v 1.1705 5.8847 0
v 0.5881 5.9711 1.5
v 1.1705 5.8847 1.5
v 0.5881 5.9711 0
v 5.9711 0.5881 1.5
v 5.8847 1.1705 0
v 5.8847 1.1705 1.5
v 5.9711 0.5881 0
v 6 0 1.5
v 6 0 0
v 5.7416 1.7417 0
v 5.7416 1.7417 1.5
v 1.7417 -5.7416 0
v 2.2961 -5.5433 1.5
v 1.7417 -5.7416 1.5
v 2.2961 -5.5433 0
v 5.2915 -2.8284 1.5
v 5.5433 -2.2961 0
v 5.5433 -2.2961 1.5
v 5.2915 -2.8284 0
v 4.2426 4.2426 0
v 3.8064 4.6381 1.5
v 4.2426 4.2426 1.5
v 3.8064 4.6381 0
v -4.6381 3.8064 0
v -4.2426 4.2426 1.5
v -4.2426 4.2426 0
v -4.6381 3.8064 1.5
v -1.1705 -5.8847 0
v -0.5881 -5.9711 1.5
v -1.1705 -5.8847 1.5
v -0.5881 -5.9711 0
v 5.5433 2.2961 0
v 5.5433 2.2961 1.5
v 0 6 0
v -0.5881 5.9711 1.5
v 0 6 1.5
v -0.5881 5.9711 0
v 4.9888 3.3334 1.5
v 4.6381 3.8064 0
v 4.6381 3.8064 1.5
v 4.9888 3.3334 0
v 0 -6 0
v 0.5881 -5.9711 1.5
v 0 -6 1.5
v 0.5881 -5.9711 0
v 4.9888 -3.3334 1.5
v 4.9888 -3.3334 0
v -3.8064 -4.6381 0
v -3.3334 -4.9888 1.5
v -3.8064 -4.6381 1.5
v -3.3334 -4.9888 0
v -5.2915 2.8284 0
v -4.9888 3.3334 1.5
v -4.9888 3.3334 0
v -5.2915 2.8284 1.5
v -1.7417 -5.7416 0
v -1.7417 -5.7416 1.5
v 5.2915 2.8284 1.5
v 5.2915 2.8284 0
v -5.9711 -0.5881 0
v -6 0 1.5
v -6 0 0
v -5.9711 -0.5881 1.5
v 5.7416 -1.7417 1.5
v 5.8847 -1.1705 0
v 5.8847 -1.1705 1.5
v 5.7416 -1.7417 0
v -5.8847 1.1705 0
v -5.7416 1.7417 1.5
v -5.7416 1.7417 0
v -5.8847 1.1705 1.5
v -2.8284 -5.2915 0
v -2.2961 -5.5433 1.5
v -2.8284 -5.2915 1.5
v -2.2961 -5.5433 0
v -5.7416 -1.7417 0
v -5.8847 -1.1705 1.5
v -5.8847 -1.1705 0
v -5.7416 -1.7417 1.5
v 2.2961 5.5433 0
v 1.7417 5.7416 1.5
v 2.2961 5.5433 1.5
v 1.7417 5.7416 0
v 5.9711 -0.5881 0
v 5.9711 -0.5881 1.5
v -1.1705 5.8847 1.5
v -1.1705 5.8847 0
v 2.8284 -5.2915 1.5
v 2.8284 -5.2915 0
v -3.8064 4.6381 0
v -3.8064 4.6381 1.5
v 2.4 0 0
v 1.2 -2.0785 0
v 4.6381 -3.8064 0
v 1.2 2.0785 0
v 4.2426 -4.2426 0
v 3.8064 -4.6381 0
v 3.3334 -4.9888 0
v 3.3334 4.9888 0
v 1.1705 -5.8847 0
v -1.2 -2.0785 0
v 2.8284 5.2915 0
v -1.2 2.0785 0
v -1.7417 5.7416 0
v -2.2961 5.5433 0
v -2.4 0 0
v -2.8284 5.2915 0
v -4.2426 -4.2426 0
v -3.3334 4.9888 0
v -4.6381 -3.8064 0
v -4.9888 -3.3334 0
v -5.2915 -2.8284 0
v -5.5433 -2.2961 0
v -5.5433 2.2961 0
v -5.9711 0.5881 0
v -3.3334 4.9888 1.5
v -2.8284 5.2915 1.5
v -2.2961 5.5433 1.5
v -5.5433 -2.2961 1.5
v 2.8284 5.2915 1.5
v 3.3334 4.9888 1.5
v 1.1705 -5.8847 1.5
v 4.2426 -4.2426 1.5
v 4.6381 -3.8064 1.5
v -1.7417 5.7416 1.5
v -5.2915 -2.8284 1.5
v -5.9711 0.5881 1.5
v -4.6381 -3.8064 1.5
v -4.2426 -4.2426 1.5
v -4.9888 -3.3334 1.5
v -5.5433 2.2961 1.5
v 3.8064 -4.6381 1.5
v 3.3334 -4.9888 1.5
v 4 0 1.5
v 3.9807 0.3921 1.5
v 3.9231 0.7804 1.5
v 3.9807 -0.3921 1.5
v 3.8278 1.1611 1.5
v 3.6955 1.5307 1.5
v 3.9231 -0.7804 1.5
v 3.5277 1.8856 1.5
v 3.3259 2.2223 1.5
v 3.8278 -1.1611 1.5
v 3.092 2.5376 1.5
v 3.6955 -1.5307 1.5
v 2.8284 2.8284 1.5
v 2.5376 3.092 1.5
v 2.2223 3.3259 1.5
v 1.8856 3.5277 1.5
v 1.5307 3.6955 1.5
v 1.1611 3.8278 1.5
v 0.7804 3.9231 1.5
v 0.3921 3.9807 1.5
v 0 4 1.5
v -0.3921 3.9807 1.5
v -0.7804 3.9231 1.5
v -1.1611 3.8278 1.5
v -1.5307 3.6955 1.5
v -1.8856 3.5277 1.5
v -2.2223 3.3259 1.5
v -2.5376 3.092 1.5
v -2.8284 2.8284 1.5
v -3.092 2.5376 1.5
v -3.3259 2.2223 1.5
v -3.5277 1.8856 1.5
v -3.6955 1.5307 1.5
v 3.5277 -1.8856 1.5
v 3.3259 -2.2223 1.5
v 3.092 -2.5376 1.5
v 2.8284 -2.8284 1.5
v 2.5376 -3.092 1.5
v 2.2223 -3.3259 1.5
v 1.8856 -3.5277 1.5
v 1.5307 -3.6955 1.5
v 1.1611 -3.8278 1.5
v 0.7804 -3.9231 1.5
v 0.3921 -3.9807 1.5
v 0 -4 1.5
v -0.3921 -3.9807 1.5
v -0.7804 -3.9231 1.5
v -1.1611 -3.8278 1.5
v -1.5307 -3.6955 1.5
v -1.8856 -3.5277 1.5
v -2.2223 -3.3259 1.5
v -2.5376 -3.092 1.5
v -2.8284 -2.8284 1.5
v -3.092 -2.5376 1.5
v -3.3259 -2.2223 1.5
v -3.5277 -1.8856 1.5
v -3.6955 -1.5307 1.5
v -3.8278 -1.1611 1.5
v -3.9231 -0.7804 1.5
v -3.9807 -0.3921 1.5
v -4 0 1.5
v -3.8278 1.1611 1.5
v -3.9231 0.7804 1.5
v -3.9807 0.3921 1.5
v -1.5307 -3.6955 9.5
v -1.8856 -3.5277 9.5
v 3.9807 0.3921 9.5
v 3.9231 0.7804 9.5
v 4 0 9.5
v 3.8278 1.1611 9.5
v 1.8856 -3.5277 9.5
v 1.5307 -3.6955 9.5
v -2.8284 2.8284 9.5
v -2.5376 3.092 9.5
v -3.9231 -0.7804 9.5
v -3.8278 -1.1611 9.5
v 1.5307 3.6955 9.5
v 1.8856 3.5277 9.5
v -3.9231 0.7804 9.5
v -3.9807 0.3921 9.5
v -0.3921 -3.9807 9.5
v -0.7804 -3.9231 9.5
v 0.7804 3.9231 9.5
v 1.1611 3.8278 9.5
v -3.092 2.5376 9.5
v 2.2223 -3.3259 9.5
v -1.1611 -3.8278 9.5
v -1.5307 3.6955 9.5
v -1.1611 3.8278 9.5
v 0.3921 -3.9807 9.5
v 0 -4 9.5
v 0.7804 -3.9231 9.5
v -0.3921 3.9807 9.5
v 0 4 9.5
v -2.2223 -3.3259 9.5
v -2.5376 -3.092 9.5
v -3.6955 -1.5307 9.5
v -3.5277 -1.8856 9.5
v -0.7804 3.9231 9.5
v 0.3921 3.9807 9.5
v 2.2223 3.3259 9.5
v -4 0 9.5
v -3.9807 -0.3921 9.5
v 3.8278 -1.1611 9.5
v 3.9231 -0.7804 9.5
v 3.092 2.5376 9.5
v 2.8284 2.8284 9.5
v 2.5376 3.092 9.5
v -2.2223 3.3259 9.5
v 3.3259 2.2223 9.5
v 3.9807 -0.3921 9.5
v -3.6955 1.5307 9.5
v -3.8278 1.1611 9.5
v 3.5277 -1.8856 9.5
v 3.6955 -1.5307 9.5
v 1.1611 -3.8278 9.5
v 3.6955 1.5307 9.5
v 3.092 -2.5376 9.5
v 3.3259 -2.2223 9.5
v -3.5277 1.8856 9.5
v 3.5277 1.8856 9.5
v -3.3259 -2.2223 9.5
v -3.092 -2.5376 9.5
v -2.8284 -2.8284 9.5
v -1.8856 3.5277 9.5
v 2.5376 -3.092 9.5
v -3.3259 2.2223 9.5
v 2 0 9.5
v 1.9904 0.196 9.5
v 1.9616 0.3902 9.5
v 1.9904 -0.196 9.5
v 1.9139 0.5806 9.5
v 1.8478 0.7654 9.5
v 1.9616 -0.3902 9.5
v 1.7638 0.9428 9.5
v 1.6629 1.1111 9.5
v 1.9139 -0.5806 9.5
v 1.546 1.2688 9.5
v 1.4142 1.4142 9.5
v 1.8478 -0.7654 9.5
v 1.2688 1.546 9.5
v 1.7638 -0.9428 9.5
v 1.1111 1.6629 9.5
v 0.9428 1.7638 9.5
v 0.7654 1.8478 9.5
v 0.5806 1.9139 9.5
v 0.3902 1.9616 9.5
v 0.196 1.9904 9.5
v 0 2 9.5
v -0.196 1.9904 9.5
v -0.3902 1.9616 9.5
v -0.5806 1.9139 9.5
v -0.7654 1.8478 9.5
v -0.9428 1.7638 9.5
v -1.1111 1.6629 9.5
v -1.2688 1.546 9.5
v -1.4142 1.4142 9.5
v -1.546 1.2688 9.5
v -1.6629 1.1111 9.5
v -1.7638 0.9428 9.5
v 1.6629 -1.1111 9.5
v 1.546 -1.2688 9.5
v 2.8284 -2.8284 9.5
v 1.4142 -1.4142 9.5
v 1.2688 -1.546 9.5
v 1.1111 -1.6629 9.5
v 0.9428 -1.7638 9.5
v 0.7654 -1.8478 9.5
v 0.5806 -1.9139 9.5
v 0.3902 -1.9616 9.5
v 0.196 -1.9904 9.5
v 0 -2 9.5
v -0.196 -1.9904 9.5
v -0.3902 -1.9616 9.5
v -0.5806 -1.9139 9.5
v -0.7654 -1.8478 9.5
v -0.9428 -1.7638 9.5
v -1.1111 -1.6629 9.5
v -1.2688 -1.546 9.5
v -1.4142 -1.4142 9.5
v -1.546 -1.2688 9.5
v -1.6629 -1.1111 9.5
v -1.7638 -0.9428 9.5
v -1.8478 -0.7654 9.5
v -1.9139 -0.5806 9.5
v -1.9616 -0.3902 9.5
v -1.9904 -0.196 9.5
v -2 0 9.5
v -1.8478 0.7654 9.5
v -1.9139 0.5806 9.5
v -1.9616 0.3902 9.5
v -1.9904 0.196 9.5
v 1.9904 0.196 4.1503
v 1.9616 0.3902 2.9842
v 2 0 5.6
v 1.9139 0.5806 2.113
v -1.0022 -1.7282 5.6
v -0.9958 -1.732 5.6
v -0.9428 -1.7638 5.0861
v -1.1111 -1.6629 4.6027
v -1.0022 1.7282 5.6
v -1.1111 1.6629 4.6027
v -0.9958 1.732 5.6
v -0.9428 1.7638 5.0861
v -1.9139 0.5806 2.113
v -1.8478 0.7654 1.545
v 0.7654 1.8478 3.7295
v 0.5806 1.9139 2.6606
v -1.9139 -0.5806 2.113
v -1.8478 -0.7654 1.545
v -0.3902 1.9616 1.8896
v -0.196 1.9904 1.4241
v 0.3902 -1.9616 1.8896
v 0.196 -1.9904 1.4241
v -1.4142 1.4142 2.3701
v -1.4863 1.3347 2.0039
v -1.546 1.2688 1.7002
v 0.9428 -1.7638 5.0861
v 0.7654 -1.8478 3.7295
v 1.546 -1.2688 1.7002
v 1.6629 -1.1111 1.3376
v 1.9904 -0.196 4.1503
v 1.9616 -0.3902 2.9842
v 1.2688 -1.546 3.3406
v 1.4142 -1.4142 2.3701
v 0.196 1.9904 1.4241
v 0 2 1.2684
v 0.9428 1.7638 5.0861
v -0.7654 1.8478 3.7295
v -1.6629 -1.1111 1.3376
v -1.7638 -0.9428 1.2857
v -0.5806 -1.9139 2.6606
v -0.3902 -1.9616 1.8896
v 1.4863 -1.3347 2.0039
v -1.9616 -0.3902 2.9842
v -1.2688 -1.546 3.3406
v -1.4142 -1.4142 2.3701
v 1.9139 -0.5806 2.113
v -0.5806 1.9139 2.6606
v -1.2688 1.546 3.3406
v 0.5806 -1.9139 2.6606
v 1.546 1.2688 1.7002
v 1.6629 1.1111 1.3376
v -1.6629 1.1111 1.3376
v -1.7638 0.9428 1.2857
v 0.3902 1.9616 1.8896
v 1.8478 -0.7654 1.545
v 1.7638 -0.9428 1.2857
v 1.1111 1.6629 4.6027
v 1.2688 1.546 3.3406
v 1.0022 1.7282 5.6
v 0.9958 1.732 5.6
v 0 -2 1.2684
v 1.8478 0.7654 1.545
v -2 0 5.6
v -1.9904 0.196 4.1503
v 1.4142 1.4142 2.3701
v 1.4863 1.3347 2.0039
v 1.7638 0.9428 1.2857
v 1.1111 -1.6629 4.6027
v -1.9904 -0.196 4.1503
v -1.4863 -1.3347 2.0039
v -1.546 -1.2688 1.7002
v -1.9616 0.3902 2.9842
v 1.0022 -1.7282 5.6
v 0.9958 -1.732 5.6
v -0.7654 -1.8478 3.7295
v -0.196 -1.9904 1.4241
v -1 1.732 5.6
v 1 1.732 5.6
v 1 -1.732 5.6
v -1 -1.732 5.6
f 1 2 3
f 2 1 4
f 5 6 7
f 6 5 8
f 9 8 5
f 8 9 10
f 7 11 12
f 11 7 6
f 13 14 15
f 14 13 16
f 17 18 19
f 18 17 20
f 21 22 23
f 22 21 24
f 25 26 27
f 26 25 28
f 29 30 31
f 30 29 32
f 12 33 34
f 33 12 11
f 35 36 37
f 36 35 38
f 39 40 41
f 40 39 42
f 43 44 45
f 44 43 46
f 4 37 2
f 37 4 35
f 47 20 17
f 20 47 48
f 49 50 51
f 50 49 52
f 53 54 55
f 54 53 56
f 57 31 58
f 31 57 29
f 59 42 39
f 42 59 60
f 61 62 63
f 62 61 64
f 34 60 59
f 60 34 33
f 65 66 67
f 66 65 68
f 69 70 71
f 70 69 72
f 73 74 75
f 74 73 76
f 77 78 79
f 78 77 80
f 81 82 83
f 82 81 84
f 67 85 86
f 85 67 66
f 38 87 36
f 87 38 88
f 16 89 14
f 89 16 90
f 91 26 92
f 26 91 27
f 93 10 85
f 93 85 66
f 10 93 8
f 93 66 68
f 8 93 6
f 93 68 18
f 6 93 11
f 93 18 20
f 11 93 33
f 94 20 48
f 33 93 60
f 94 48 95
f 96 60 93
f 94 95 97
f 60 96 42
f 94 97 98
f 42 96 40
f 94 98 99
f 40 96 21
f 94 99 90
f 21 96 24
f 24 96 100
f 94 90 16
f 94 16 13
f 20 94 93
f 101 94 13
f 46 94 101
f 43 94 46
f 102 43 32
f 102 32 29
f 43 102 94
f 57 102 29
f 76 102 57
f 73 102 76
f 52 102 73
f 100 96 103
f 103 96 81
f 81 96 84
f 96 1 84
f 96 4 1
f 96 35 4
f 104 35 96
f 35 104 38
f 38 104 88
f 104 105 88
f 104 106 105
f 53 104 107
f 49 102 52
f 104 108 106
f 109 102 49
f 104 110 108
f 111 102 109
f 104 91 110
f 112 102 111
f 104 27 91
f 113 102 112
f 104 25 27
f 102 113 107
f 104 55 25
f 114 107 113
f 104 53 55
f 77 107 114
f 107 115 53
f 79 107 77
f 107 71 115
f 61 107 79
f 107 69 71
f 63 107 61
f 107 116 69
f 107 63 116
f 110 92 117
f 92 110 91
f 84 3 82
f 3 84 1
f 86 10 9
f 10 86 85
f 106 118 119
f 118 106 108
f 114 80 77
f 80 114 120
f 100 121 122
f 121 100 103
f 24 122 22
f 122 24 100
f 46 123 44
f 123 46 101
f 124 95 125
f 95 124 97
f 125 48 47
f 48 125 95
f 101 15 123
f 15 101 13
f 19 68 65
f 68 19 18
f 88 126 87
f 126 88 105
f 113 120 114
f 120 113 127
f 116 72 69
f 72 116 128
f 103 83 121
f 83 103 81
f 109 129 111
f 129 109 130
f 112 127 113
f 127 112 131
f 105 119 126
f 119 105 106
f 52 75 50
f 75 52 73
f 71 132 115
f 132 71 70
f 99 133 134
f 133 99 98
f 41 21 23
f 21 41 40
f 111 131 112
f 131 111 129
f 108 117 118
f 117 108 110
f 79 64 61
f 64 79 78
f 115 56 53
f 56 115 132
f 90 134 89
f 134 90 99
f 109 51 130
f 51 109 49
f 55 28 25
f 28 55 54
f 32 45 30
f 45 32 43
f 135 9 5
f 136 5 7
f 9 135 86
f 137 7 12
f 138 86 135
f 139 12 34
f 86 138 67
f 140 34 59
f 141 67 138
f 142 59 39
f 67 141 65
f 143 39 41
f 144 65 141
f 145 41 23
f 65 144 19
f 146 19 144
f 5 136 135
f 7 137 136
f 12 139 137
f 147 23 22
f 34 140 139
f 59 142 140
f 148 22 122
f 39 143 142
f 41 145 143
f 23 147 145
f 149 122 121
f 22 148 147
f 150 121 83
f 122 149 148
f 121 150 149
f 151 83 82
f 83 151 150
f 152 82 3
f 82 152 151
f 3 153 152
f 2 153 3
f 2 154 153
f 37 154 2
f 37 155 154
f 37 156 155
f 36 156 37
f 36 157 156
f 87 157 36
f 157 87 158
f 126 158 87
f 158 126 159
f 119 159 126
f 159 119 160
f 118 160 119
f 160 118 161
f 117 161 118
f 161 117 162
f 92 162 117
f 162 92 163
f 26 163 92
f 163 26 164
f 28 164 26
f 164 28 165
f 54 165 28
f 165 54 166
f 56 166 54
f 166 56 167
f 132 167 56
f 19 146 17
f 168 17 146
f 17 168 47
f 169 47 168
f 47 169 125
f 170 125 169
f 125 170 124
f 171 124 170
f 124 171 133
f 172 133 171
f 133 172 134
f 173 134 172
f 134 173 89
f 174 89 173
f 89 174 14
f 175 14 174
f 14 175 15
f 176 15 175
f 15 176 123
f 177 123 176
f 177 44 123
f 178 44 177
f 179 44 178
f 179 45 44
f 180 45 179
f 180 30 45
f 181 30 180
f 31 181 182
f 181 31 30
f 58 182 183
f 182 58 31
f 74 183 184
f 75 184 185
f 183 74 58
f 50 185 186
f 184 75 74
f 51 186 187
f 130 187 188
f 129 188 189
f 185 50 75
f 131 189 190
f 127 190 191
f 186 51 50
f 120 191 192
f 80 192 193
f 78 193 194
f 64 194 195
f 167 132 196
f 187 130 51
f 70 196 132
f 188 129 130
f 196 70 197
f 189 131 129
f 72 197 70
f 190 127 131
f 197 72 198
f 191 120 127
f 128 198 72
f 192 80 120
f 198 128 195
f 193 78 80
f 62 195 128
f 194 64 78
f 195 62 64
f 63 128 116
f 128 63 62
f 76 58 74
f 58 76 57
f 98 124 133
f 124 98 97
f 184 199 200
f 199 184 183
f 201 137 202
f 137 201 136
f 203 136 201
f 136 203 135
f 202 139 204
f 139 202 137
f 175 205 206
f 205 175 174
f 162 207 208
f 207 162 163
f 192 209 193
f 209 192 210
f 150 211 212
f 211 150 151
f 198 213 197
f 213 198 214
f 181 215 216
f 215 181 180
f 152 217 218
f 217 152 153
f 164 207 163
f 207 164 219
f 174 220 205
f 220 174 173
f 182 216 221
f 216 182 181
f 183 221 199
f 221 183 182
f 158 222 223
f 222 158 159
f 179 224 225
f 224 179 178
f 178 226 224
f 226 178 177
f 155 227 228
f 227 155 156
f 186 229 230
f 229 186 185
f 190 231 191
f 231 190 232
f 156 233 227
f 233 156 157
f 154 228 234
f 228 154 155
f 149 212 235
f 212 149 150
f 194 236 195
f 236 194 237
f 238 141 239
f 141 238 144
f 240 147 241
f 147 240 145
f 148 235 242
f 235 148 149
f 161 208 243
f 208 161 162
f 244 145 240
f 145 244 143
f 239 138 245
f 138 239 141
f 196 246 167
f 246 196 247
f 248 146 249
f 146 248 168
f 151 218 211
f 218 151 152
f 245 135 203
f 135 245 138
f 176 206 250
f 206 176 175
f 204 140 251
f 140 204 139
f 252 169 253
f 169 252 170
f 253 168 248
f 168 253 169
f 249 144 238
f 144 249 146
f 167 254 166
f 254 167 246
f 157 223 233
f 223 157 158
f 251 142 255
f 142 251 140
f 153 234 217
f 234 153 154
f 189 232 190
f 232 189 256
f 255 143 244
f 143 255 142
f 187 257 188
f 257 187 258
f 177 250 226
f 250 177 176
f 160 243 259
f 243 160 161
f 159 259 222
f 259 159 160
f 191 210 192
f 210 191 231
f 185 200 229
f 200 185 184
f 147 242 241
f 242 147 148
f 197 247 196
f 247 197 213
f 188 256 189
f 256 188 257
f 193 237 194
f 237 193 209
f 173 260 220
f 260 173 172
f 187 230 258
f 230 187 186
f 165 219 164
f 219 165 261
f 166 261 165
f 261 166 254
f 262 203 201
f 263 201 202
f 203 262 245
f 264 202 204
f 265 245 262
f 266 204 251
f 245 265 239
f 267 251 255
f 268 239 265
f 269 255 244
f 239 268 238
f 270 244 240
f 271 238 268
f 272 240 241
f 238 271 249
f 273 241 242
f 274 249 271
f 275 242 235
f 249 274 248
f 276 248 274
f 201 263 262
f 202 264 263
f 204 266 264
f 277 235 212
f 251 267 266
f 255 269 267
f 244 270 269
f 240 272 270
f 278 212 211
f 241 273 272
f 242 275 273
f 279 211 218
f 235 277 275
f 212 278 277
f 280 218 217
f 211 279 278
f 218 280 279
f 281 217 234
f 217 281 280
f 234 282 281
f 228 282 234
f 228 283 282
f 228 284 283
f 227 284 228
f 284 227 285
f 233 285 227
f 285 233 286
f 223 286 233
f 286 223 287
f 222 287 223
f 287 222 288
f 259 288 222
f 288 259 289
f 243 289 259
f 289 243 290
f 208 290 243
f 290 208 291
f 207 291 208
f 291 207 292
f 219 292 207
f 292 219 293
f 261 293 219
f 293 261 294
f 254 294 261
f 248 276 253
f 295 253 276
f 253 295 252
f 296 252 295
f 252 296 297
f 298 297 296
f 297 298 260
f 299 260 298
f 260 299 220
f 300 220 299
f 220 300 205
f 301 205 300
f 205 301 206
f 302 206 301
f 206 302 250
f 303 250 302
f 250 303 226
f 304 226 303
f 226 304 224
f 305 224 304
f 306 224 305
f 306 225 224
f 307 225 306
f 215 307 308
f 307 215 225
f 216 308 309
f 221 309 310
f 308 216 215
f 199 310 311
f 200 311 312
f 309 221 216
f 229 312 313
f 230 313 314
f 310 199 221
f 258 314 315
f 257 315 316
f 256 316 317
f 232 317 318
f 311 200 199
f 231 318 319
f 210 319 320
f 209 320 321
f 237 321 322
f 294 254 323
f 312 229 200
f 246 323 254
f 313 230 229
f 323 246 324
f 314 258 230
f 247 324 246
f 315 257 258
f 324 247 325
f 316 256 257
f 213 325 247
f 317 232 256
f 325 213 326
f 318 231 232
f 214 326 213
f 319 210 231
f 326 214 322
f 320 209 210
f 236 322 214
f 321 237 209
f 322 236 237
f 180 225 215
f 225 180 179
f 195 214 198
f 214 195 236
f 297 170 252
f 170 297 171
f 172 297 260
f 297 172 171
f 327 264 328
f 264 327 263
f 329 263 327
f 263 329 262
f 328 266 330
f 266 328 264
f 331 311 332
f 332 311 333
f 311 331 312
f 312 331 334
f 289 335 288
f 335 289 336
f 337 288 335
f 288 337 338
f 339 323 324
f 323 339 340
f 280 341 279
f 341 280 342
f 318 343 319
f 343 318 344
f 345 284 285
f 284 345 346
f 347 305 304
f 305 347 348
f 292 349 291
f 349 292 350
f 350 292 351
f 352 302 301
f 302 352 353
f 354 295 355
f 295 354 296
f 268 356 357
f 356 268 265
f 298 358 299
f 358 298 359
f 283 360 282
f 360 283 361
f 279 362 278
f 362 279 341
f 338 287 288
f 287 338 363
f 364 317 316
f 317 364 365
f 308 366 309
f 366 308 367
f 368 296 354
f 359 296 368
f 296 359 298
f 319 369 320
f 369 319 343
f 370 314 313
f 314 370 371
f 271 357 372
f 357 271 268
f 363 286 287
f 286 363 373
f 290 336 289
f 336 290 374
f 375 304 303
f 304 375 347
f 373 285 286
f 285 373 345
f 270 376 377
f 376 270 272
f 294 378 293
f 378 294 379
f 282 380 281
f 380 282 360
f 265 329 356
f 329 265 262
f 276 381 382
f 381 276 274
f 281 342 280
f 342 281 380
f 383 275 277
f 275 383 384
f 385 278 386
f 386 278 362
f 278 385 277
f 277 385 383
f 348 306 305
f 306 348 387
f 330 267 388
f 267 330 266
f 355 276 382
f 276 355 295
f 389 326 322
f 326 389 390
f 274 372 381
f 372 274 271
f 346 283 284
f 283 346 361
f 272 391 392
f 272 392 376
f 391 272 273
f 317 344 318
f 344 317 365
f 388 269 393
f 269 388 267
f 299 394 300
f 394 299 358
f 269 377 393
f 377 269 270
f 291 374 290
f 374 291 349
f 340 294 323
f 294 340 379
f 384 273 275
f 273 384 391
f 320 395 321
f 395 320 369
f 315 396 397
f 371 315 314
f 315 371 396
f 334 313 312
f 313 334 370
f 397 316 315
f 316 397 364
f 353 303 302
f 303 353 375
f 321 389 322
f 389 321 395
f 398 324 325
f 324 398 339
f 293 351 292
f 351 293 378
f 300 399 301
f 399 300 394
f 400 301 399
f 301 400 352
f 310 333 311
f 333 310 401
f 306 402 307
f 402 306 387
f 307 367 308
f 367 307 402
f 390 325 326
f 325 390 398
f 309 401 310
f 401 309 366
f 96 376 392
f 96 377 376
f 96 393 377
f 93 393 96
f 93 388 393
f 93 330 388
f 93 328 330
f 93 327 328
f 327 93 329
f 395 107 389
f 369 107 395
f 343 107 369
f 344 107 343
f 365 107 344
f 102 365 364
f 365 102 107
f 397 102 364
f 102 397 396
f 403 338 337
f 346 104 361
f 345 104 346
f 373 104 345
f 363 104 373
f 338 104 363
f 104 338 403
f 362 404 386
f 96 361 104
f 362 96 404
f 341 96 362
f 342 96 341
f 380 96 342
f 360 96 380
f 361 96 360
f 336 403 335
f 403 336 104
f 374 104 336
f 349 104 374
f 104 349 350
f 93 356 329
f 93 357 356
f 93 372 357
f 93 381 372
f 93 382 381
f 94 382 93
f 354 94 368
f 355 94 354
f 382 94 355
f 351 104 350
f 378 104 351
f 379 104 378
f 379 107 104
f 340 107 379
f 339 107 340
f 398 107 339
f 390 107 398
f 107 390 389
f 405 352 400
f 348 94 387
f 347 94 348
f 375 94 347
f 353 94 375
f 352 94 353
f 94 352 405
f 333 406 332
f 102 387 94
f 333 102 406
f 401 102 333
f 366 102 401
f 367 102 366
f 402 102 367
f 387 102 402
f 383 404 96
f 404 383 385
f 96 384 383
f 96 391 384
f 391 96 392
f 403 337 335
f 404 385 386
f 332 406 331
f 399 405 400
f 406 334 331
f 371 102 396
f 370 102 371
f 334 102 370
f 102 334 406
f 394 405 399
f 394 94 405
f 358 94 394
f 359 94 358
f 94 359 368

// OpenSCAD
// OpenSCAD Threads
// http://dkprojects.net/openscad-threads/
include <threads.scad>;
part = "Hollow_screw"; // [Hollow_screw, Main_body, Main_magnet_cover, Hose_adapter, Hose_sleeve,Magnetic_holder, Holder_magnet_cover,Instrument,All]
screw_shape="Allen"; //[Allen,Square,Hexagonal]
adapter_shape="Hexagonal"; //[Round,Square,Hexagonal]
light_trap=false;
hose_inner_diameter=6;
hose_outer_diameter=9;
main_part_holes=7;
insert_diameter=8;
screw_diameter=8;
seal_length=8;
magnet_diameter=15;
magnet_height=5;
wall_between_magnets=1;
thread_pitch=3;
thread_expand=2.0;
adapter_inner_diameter=4;
screw_inner_diameter=4;
offset=0;
rod_mount=false;
nut_width=16;
mount_hole=8;
$fn= $preview ? 32 : 64;
leader_length=10;
tap_length=30;
leader_diameter=7;
tap_diameter=8;
air_gap=0.5;
holding_depth=3;
onside=false;
degre=onside?90:0;
shape=(adapter_shape=="Round")?64:(adapter_shape=="Square")?4:6;
        coeff=  (adapter_shape == "Round") ? 1:(adapter_shape == "Square") ? 1.42:1.16;
    body_move=(light_trap)?(hose_outer_diameter/2+4)*coeff+2*main_part_holes+2:seal_length+main_part_holes/2+hose_outer_diameter/2+2;
shiftx=light_trap?-(max(offset+(magnet_diameter+2*0.541*thread_pitch)/2,2.5*main_part_holes+seal_length)):-(seal_length+main_part_holes/2);
shiftz=light_trap?coeff*(hose_outer_diameter+4)/2:seal_length+main_part_holes/2;
instrument_length=leader_length+tap_length+holding_depth;
module hollow_screw(){
    difference(){
        union(){
            cylinder(h=1.5,d=screw_diameter+4);
            translate([0,0,1.5])cylinder(h=seal_length,d=screw_diameter);}
            cylinder(d=screw_inner_diameter,h=seal_length+2);
            cylinder(seal_length*0.7,screw_inner_diameter*0.6,screw_inner_diameter*0.5, $fn=6);
        }
    }
    diameter_to_hold=magnet_diameter+2*0.541*thread_pitch+thread_expand+3;
    height_to_hold=magnet_height+thread_pitch*2+wall_between_magnets;
        
module main_body(nothread=false){
    if (light_trap==false)
    rotate([0,degre,0])translate([shiftx,0,0])difference(){
      union(){cylinder(d=max(main_part_holes+2*seal_length,magnet_diameter+2*0.541*thread_pitch),h=seal_length+main_part_holes/2+hose_outer_diameter/2+2);
      translate([0,-hose_outer_diameter/2-2,0]) cube([seal_length+main_part_holes/2, hose_outer_diameter+4,seal_length+main_part_holes/2+hose_outer_diameter/2+2]);
   translate([0,0,seal_length+main_part_holes/2+hose_outer_diameter/2+2]) metric_thread(magnet_diameter+2*0.541*thread_pitch,thread_pitch,thread_pitch*2,test=nothread);
      }
      translate([0,0,-1])cylinder(d=main_part_holes,h=seal_length+main_part_holes/2+1);
     translate([0,0,seal_length+main_part_holes/2])rotate([0,90,0])cylinder(d=main_part_holes, h=seal_length+main_part_holes/2+1);
      translate([0,0,seal_length+main_part_holes/2])intersection(){cylinder(d=main_part_holes, h=main_part_holes,center=true);rotate([0,90,0])cylinder(d=main_part_holes, h=main_part_holes,center=true);}
    }
else //light trap
        rotate([0,degre,0])translate([shiftx,0,0])difference(){
       union(){
           cylinder(d=hose_outer_diameter+4,h=(hose_outer_diameter/2+4)*coeff+2*main_part_holes+2);
           
           translate([offset,0,0])cylinder(d=magnet_diameter+2*0.541*thread_pitch,h=(hose_outer_diameter/2+4)*coeff+2*main_part_holes+2);
           translate([0,-hose_outer_diameter/2-2,0]) cube([max(offset+(magnet_diameter+2*0.541*thread_pitch)/2,2.5*main_part_holes+seal_length),hose_outer_diameter+4,(hose_outer_diameter/2+4)*coeff+2*main_part_holes+2]);
     translate([offset,0,(hose_outer_diameter/2+4)*coeff+2*main_part_holes+2]) metric_thread(magnet_diameter+2*0.541*thread_pitch,thread_pitch,thread_pitch*2,test=nothread);
           }
      translate([0,0,-1])cylinder(d=main_part_holes,h=coeff*(hose_outer_diameter+4)/2+2*main_part_holes+1);
      
       translate([0,0,coeff*(hose_outer_diameter+4)/2+2*main_part_holes])rotate([0,90,0])cylinder(d=main_part_holes,h=2*main_part_holes);     
           
      translate([2*main_part_holes,0,coeff*(hose_outer_diameter+4)/2])cylinder(d=main_part_holes,h=2*main_part_holes);
          
     translate([2*main_part_holes,0,coeff*(hose_outer_diameter+4)/2])rotate([0,90,0])cylinder(d=main_part_holes,h=offset+magnet_diameter/2+0.541*thread_pitch+seal_length); 
      
           translate([0,0,coeff*(hose_outer_diameter+4)/2+2*main_part_holes])intersection(){cylinder(d=main_part_holes, h=main_part_holes,center=true);rotate([0,90,0])cylinder(d=main_part_holes, h=main_part_holes,center=true);}
            translate([2*main_part_holes,0,coeff*(hose_outer_diameter+4)/2+2*main_part_holes])intersection(){cylinder(d=main_part_holes, h=main_part_holes,center=true);rotate([0,90,0])cylinder(d=main_part_holes, h=main_part_holes,center=true);}
            translate([2*main_part_holes,0,coeff*(hose_outer_diameter+4)/2])intersection(){cylinder(d=main_part_holes, h=main_part_holes,center=true);rotate([0,90,0])cylinder(d=main_part_holes, h=main_part_holes,center=true);}
    }
    }
module main_magnet_cover(nothread=false){
  difference(){
   cylinder(d=magnet_diameter+2*0.541*thread_pitch+thread_expand+3,h=magnet_height+thread_pitch*2+wall_between_magnets);
       translate([0,0,wall_between_magnets]){metric_thread(magnet_diameter+2*0.541*thread_pitch+thread_expand,thread_pitch,magnet_height+thread_pitch*2,internal=true,test=nothread);}
  }
}
module hose_adapter(){
    difference(){
        union(){
            cylinder(h=seal_length,d=insert_diameter);
            translate([0,0,seal_length])cylinder(h=4,d=(hose_outer_diameter+1)*coeff,$fn=shape);
            translate([0,0,seal_length+4])cylinder(h=seal_length,d=hose_inner_diameter);
            }
            cylinder(d=adapter_inner_diameter,h=4+2*seal_length);
        }
    }
module hose_sleeve(){
    difference(){
        cylinder(h=seal_length+4,d=coeff*(hose_outer_diameter+4),$fn=shape);
        cylinder(h=seal_length+4,d=hose_outer_diameter);
        translate([0,0,seal_length])cylinder(h=4,d=(hose_outer_diameter+2)*coeff,$fn=shape);
    }
    }
module holder_magnet_cover(nothread=false){
    difference(){
    metric_thread(1+3+diameter_to_hold+2*0.541*thread_pitch,thread_pitch,height_to_hold+wall_between_magnets,test=nothread);
    translate([0,0,wall_between_magnets])cylinder(d=diameter_to_hold+1,h=height_to_hold);
    translate([0,0,height_to_hold+wall_between_magnets-1])cube([2,6+diameter_to_hold+2*0.541*thread_pitch,2],center=true);
        }    
    }
module magnetic_holder(nothread=false){
    difference(){
        union(){
        cylinder(h=2+magnet_height+wall_between_magnets+height_to_hold, d=1+3+diameter_to_hold+2*0.541*thread_pitch+thread_expand+3);
          if(rod_mount) translate([0,0,nut_width/2]) cube([1+3+diameter_to_hold+2*0.541*thread_pitch+thread_expand+2*nut_width,nut_width,nut_width],center=true);
        }
        translate([0,0,2])cylinder(h=magnet_height,d=magnet_diameter+2);
        translate([0,0,2+magnet_height])metric_thread(1+3+diameter_to_hold+2*0.541*thread_pitch+thread_expand,thread_pitch,height_to_hold+wall_between_magnets,internal=true,test=nothread);
       translate([-(1+3+diameter_to_hold+2*0.541*thread_pitch+thread_expand+nut_width)/2,0,nut_width/2])rotate([90,0,0])cylinder(h=nut_width+2,d=mount_hole,center=true);
        translate([(1+3+diameter_to_hold+2*0.541*thread_pitch+thread_expand+nut_width)/2,0,nut_width/2])rotate([90,0,0])cylinder(h=nut_width+2,d=mount_hole,center=true);
        }}
module instrument(thingie)
        {
     $fn=16;
    difference(){
    scale([1,1,instrument_length])minkowski()
    {
        translate([-holding_depth-air_gap,-holding_depth-air_gap,0])cube([2*holding_depth+2*air_gap,2*holding_depth+2*air_gap,0.01]);
        intersection()
        {
        main_body(nothread=true);
        cylinder(d=500,h=0.99);
        }
    }
    translate([0,0,instrument_length-holding_depth])minkowski()
    {
        cube(air_gap,center=true);
        intersection()
        {
        main_body(nothread=true);
        cylinder(d=500,h=holding_depth);
        }
    }  
    shift=onside?shiftz:shiftx;
  translate([shift,0,0]){translate([0,0,-1])cylinder(d=leader_diameter,h=leader_length+2);
  translate([0,0,leader_length])cylinder(d=tap_diameter,h=instrument_length);}              }
            }
if (part=="Hollow_screw") {
    hollow_screw();
}
if (part=="Main_body") {
    main_body();
}
if (part=="Main_magnet_cover") {
    main_magnet_cover();
}
if (part=="Hose_adapter") {
    hose_adapter();
}
if (part=="Hose_sleeve") {
    hose_sleeve();
}
if (part=="Magnetic_holder") {
    magnetic_holder();
}
if (part=="Holder_magnet_cover") {
    holder_magnet_cover();
}
if (part=="Instrument")
{
instrument(); 
}
if (part=="All") {
    color("green")magnetic_holder();
    color("red")translate([0,0,2+magnet_height])holder_magnet_cover();
    color("blue")translate([0,0,2+magnet_height+wall_between_magnets])main_magnet_cover();
color("green")translate([0,0,2+magnet_height+wall_between_magnets+height_to_hold+body_move])rotate([180,0,0])main_body();
//color("red")translate([0,0,0])hollow_screw();
//hose_adapter();
//hose_sleeve();

holder_magnet_cover();
}
echo(str("distance between rods ",(1+3+diameter_to_hold+2*0.541*thread_pitch+thread_expand+nut_width)));
